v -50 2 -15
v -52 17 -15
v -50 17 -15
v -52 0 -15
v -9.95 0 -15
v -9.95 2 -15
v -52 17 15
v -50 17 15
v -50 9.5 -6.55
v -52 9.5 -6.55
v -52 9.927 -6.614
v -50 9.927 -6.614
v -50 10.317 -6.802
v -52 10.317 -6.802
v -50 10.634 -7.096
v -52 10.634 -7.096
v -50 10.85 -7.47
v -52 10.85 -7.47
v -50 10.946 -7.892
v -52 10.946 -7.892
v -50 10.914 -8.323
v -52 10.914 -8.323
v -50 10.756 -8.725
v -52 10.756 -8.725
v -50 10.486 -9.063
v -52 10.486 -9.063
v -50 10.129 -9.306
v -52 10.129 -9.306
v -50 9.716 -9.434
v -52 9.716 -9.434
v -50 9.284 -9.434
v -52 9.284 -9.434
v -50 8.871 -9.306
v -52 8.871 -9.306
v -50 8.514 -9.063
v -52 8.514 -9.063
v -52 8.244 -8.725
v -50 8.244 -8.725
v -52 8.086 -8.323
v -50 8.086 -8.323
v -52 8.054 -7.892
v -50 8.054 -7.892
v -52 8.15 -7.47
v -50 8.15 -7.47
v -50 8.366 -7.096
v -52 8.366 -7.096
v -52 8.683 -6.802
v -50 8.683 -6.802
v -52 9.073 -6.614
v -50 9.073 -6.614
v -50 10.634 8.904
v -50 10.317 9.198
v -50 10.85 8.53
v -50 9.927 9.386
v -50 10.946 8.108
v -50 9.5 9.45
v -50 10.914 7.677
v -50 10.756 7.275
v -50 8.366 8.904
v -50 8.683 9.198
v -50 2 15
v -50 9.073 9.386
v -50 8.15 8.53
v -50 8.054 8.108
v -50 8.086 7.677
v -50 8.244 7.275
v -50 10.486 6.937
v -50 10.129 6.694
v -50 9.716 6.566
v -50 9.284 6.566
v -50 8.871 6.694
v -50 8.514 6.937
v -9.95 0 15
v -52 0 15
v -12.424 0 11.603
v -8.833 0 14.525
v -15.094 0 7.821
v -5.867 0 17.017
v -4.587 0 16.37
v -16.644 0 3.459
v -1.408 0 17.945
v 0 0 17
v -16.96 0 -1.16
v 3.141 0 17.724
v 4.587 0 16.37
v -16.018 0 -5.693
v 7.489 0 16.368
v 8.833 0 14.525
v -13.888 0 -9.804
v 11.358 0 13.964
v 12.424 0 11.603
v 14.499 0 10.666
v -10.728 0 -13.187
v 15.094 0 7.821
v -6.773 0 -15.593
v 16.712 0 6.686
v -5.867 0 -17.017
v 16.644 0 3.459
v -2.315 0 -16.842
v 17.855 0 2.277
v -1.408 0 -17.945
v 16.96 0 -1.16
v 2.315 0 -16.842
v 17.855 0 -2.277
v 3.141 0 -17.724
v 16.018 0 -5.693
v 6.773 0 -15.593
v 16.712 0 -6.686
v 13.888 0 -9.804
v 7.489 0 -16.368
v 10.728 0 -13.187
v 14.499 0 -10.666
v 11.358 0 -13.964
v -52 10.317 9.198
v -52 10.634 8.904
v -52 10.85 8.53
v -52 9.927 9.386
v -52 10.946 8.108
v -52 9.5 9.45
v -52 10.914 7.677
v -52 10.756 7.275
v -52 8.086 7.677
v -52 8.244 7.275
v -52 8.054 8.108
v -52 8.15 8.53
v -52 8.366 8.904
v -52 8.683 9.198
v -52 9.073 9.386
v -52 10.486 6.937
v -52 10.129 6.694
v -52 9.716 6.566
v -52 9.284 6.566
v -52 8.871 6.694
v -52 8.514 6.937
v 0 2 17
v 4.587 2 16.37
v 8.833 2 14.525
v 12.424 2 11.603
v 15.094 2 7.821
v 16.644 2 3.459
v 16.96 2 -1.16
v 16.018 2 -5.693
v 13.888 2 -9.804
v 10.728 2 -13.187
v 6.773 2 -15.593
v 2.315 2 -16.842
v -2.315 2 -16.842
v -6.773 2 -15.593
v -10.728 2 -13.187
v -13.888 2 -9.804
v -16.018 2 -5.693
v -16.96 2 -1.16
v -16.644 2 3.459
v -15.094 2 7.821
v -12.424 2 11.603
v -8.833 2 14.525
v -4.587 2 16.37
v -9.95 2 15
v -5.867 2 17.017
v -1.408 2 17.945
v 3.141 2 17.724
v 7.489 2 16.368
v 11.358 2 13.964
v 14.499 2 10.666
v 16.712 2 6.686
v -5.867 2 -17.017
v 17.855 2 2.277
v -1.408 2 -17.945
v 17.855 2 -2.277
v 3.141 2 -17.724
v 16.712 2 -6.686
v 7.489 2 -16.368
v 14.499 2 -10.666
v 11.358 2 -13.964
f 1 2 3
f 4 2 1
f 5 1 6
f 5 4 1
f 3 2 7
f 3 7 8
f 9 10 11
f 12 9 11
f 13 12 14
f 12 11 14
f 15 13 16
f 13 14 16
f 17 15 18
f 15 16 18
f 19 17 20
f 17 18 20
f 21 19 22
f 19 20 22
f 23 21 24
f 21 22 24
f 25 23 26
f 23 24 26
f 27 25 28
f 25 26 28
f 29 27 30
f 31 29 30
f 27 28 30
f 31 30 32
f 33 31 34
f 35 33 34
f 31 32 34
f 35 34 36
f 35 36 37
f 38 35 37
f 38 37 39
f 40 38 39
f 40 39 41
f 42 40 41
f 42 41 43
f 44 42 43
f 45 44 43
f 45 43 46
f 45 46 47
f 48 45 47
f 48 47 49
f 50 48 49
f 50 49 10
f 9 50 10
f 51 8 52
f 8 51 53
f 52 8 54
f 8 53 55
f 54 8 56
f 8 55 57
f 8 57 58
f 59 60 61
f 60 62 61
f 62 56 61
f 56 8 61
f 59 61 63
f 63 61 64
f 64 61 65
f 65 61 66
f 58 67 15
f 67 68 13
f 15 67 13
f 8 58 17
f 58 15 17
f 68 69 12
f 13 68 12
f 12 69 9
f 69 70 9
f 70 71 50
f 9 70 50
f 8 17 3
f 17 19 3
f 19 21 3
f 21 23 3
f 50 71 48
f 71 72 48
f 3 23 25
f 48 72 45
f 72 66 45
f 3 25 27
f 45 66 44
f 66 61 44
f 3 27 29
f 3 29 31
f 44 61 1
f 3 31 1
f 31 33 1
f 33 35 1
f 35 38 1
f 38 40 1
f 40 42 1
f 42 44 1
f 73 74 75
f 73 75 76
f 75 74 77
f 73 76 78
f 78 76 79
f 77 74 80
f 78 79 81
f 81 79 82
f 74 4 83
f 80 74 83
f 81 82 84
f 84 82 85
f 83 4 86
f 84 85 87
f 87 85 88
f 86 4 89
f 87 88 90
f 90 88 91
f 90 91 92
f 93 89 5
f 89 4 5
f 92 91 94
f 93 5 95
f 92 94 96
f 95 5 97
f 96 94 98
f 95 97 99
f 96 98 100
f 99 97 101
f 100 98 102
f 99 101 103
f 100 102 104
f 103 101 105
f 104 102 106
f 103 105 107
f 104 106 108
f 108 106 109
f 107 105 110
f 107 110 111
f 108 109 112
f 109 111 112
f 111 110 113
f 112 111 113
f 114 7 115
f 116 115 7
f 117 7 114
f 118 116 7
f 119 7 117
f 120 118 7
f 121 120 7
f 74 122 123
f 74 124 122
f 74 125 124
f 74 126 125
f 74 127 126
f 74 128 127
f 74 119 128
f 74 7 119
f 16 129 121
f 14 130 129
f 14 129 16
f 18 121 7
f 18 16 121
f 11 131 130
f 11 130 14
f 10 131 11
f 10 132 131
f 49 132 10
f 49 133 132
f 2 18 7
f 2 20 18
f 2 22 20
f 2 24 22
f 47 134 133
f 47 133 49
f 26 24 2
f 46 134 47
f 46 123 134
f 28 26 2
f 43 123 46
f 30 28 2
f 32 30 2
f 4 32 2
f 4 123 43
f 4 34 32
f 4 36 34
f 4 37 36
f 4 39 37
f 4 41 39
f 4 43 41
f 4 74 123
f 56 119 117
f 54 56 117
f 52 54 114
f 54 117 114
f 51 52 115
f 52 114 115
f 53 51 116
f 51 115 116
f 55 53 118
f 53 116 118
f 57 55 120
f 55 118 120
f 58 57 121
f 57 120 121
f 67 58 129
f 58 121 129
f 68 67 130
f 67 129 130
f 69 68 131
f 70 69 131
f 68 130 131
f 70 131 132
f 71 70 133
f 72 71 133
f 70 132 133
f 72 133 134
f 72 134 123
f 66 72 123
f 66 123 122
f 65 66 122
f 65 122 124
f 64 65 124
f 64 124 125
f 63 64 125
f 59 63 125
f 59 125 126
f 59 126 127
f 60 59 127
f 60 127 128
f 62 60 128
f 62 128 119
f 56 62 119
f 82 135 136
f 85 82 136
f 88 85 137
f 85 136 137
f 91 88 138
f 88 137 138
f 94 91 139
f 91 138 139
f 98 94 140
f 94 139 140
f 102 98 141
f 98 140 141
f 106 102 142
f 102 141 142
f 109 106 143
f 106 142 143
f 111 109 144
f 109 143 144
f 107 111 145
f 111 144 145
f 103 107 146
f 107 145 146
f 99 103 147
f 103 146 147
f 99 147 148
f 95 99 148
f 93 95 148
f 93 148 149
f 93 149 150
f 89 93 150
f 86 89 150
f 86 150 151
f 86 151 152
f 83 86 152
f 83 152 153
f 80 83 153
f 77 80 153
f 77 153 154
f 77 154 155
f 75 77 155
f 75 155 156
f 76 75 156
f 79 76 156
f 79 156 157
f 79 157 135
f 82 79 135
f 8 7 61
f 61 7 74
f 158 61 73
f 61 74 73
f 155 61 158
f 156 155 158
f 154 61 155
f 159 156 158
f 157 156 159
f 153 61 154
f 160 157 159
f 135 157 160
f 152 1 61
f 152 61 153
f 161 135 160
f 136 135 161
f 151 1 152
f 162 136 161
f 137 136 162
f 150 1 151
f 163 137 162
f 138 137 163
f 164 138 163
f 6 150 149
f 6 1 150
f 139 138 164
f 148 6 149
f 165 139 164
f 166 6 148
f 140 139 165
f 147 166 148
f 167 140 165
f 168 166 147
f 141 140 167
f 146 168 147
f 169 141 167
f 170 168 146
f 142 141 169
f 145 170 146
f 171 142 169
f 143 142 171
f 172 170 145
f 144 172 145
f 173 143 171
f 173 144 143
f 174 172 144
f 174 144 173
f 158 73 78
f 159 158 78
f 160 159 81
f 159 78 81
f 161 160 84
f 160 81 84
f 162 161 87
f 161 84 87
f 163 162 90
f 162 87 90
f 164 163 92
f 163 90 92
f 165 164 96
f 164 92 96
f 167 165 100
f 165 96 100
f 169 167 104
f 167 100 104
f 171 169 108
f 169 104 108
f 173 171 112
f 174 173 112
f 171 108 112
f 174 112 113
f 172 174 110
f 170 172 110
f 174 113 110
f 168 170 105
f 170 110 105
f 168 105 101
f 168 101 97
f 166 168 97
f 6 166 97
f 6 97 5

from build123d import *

# Parameters (mm, degrees)
SKETCH_1_R           = 18
EXTRUDE_1_DEPTH      = 2
SKETCH_2_W           = 2
SKETCH_2_H           = 30
EXTRUDE_2_DEPTH      = 15
HOLE_WIZARD_M3_5_1_D = 2.9
SKETCH_6_R           = 17
CUT_EXTRUDE_1_DEPTH  = 15


with BuildPart() as part:
    # 草图1 → 凸台-拉伸1 (new body)
    with BuildSketch(Plane(origin=(0, 0, 0), x_dir=(1, 0, 0), z_dir=(0, 1, 0))):
        Circle(SKETCH_1_R)
        with BuildLine():
            Line((-9.949874371, 15), (-52, 15))
            Line((-52, 15), (-52, -15))
            Line((-52, -15), (-9.949874371, -15))
            ThreePointArc((-9.949874371, -15), (-18, 0), (-9.949874371, 15))
        make_face()
    extrude(amount=EXTRUDE_1_DEPTH)

    # 草图2 → 凸台-拉伸2 (add)
    with BuildSketch(Plane(origin=(0, 2, 0), x_dir=(1, 0, 0), z_dir=(0, 1, 0))):
        with Locations((-51, 0)):
            Rectangle(SKETCH_2_W, SKETCH_2_H)
    extrude(amount=EXTRUDE_2_DEPTH)

    # M3.5 螺纹孔1 (through all)
    with Locations(Plane(origin=(-50, 0, 0), x_dir=(0, 0, -1), z_dir=(1, 0, 0))):
        with Locations((-8, 9.5), (8, 9.5)):
            Hole(HOLE_WIZARD_M3_5_1_D / 2)

    # 草图6 → 切除-拉伸1 (cut)
    with BuildSketch(Plane(origin=(0, 2, 0), x_dir=(1, 0, 0), z_dir=(0, 1, 0))):
        with Locations(Location((0, 0, 0), (0, 0, 270))):
            Circle(SKETCH_6_R)
    extrude(amount=-CUT_EXTRUDE_1_DEPTH, mode=Mode.SUBTRACT)


solid = part.part
